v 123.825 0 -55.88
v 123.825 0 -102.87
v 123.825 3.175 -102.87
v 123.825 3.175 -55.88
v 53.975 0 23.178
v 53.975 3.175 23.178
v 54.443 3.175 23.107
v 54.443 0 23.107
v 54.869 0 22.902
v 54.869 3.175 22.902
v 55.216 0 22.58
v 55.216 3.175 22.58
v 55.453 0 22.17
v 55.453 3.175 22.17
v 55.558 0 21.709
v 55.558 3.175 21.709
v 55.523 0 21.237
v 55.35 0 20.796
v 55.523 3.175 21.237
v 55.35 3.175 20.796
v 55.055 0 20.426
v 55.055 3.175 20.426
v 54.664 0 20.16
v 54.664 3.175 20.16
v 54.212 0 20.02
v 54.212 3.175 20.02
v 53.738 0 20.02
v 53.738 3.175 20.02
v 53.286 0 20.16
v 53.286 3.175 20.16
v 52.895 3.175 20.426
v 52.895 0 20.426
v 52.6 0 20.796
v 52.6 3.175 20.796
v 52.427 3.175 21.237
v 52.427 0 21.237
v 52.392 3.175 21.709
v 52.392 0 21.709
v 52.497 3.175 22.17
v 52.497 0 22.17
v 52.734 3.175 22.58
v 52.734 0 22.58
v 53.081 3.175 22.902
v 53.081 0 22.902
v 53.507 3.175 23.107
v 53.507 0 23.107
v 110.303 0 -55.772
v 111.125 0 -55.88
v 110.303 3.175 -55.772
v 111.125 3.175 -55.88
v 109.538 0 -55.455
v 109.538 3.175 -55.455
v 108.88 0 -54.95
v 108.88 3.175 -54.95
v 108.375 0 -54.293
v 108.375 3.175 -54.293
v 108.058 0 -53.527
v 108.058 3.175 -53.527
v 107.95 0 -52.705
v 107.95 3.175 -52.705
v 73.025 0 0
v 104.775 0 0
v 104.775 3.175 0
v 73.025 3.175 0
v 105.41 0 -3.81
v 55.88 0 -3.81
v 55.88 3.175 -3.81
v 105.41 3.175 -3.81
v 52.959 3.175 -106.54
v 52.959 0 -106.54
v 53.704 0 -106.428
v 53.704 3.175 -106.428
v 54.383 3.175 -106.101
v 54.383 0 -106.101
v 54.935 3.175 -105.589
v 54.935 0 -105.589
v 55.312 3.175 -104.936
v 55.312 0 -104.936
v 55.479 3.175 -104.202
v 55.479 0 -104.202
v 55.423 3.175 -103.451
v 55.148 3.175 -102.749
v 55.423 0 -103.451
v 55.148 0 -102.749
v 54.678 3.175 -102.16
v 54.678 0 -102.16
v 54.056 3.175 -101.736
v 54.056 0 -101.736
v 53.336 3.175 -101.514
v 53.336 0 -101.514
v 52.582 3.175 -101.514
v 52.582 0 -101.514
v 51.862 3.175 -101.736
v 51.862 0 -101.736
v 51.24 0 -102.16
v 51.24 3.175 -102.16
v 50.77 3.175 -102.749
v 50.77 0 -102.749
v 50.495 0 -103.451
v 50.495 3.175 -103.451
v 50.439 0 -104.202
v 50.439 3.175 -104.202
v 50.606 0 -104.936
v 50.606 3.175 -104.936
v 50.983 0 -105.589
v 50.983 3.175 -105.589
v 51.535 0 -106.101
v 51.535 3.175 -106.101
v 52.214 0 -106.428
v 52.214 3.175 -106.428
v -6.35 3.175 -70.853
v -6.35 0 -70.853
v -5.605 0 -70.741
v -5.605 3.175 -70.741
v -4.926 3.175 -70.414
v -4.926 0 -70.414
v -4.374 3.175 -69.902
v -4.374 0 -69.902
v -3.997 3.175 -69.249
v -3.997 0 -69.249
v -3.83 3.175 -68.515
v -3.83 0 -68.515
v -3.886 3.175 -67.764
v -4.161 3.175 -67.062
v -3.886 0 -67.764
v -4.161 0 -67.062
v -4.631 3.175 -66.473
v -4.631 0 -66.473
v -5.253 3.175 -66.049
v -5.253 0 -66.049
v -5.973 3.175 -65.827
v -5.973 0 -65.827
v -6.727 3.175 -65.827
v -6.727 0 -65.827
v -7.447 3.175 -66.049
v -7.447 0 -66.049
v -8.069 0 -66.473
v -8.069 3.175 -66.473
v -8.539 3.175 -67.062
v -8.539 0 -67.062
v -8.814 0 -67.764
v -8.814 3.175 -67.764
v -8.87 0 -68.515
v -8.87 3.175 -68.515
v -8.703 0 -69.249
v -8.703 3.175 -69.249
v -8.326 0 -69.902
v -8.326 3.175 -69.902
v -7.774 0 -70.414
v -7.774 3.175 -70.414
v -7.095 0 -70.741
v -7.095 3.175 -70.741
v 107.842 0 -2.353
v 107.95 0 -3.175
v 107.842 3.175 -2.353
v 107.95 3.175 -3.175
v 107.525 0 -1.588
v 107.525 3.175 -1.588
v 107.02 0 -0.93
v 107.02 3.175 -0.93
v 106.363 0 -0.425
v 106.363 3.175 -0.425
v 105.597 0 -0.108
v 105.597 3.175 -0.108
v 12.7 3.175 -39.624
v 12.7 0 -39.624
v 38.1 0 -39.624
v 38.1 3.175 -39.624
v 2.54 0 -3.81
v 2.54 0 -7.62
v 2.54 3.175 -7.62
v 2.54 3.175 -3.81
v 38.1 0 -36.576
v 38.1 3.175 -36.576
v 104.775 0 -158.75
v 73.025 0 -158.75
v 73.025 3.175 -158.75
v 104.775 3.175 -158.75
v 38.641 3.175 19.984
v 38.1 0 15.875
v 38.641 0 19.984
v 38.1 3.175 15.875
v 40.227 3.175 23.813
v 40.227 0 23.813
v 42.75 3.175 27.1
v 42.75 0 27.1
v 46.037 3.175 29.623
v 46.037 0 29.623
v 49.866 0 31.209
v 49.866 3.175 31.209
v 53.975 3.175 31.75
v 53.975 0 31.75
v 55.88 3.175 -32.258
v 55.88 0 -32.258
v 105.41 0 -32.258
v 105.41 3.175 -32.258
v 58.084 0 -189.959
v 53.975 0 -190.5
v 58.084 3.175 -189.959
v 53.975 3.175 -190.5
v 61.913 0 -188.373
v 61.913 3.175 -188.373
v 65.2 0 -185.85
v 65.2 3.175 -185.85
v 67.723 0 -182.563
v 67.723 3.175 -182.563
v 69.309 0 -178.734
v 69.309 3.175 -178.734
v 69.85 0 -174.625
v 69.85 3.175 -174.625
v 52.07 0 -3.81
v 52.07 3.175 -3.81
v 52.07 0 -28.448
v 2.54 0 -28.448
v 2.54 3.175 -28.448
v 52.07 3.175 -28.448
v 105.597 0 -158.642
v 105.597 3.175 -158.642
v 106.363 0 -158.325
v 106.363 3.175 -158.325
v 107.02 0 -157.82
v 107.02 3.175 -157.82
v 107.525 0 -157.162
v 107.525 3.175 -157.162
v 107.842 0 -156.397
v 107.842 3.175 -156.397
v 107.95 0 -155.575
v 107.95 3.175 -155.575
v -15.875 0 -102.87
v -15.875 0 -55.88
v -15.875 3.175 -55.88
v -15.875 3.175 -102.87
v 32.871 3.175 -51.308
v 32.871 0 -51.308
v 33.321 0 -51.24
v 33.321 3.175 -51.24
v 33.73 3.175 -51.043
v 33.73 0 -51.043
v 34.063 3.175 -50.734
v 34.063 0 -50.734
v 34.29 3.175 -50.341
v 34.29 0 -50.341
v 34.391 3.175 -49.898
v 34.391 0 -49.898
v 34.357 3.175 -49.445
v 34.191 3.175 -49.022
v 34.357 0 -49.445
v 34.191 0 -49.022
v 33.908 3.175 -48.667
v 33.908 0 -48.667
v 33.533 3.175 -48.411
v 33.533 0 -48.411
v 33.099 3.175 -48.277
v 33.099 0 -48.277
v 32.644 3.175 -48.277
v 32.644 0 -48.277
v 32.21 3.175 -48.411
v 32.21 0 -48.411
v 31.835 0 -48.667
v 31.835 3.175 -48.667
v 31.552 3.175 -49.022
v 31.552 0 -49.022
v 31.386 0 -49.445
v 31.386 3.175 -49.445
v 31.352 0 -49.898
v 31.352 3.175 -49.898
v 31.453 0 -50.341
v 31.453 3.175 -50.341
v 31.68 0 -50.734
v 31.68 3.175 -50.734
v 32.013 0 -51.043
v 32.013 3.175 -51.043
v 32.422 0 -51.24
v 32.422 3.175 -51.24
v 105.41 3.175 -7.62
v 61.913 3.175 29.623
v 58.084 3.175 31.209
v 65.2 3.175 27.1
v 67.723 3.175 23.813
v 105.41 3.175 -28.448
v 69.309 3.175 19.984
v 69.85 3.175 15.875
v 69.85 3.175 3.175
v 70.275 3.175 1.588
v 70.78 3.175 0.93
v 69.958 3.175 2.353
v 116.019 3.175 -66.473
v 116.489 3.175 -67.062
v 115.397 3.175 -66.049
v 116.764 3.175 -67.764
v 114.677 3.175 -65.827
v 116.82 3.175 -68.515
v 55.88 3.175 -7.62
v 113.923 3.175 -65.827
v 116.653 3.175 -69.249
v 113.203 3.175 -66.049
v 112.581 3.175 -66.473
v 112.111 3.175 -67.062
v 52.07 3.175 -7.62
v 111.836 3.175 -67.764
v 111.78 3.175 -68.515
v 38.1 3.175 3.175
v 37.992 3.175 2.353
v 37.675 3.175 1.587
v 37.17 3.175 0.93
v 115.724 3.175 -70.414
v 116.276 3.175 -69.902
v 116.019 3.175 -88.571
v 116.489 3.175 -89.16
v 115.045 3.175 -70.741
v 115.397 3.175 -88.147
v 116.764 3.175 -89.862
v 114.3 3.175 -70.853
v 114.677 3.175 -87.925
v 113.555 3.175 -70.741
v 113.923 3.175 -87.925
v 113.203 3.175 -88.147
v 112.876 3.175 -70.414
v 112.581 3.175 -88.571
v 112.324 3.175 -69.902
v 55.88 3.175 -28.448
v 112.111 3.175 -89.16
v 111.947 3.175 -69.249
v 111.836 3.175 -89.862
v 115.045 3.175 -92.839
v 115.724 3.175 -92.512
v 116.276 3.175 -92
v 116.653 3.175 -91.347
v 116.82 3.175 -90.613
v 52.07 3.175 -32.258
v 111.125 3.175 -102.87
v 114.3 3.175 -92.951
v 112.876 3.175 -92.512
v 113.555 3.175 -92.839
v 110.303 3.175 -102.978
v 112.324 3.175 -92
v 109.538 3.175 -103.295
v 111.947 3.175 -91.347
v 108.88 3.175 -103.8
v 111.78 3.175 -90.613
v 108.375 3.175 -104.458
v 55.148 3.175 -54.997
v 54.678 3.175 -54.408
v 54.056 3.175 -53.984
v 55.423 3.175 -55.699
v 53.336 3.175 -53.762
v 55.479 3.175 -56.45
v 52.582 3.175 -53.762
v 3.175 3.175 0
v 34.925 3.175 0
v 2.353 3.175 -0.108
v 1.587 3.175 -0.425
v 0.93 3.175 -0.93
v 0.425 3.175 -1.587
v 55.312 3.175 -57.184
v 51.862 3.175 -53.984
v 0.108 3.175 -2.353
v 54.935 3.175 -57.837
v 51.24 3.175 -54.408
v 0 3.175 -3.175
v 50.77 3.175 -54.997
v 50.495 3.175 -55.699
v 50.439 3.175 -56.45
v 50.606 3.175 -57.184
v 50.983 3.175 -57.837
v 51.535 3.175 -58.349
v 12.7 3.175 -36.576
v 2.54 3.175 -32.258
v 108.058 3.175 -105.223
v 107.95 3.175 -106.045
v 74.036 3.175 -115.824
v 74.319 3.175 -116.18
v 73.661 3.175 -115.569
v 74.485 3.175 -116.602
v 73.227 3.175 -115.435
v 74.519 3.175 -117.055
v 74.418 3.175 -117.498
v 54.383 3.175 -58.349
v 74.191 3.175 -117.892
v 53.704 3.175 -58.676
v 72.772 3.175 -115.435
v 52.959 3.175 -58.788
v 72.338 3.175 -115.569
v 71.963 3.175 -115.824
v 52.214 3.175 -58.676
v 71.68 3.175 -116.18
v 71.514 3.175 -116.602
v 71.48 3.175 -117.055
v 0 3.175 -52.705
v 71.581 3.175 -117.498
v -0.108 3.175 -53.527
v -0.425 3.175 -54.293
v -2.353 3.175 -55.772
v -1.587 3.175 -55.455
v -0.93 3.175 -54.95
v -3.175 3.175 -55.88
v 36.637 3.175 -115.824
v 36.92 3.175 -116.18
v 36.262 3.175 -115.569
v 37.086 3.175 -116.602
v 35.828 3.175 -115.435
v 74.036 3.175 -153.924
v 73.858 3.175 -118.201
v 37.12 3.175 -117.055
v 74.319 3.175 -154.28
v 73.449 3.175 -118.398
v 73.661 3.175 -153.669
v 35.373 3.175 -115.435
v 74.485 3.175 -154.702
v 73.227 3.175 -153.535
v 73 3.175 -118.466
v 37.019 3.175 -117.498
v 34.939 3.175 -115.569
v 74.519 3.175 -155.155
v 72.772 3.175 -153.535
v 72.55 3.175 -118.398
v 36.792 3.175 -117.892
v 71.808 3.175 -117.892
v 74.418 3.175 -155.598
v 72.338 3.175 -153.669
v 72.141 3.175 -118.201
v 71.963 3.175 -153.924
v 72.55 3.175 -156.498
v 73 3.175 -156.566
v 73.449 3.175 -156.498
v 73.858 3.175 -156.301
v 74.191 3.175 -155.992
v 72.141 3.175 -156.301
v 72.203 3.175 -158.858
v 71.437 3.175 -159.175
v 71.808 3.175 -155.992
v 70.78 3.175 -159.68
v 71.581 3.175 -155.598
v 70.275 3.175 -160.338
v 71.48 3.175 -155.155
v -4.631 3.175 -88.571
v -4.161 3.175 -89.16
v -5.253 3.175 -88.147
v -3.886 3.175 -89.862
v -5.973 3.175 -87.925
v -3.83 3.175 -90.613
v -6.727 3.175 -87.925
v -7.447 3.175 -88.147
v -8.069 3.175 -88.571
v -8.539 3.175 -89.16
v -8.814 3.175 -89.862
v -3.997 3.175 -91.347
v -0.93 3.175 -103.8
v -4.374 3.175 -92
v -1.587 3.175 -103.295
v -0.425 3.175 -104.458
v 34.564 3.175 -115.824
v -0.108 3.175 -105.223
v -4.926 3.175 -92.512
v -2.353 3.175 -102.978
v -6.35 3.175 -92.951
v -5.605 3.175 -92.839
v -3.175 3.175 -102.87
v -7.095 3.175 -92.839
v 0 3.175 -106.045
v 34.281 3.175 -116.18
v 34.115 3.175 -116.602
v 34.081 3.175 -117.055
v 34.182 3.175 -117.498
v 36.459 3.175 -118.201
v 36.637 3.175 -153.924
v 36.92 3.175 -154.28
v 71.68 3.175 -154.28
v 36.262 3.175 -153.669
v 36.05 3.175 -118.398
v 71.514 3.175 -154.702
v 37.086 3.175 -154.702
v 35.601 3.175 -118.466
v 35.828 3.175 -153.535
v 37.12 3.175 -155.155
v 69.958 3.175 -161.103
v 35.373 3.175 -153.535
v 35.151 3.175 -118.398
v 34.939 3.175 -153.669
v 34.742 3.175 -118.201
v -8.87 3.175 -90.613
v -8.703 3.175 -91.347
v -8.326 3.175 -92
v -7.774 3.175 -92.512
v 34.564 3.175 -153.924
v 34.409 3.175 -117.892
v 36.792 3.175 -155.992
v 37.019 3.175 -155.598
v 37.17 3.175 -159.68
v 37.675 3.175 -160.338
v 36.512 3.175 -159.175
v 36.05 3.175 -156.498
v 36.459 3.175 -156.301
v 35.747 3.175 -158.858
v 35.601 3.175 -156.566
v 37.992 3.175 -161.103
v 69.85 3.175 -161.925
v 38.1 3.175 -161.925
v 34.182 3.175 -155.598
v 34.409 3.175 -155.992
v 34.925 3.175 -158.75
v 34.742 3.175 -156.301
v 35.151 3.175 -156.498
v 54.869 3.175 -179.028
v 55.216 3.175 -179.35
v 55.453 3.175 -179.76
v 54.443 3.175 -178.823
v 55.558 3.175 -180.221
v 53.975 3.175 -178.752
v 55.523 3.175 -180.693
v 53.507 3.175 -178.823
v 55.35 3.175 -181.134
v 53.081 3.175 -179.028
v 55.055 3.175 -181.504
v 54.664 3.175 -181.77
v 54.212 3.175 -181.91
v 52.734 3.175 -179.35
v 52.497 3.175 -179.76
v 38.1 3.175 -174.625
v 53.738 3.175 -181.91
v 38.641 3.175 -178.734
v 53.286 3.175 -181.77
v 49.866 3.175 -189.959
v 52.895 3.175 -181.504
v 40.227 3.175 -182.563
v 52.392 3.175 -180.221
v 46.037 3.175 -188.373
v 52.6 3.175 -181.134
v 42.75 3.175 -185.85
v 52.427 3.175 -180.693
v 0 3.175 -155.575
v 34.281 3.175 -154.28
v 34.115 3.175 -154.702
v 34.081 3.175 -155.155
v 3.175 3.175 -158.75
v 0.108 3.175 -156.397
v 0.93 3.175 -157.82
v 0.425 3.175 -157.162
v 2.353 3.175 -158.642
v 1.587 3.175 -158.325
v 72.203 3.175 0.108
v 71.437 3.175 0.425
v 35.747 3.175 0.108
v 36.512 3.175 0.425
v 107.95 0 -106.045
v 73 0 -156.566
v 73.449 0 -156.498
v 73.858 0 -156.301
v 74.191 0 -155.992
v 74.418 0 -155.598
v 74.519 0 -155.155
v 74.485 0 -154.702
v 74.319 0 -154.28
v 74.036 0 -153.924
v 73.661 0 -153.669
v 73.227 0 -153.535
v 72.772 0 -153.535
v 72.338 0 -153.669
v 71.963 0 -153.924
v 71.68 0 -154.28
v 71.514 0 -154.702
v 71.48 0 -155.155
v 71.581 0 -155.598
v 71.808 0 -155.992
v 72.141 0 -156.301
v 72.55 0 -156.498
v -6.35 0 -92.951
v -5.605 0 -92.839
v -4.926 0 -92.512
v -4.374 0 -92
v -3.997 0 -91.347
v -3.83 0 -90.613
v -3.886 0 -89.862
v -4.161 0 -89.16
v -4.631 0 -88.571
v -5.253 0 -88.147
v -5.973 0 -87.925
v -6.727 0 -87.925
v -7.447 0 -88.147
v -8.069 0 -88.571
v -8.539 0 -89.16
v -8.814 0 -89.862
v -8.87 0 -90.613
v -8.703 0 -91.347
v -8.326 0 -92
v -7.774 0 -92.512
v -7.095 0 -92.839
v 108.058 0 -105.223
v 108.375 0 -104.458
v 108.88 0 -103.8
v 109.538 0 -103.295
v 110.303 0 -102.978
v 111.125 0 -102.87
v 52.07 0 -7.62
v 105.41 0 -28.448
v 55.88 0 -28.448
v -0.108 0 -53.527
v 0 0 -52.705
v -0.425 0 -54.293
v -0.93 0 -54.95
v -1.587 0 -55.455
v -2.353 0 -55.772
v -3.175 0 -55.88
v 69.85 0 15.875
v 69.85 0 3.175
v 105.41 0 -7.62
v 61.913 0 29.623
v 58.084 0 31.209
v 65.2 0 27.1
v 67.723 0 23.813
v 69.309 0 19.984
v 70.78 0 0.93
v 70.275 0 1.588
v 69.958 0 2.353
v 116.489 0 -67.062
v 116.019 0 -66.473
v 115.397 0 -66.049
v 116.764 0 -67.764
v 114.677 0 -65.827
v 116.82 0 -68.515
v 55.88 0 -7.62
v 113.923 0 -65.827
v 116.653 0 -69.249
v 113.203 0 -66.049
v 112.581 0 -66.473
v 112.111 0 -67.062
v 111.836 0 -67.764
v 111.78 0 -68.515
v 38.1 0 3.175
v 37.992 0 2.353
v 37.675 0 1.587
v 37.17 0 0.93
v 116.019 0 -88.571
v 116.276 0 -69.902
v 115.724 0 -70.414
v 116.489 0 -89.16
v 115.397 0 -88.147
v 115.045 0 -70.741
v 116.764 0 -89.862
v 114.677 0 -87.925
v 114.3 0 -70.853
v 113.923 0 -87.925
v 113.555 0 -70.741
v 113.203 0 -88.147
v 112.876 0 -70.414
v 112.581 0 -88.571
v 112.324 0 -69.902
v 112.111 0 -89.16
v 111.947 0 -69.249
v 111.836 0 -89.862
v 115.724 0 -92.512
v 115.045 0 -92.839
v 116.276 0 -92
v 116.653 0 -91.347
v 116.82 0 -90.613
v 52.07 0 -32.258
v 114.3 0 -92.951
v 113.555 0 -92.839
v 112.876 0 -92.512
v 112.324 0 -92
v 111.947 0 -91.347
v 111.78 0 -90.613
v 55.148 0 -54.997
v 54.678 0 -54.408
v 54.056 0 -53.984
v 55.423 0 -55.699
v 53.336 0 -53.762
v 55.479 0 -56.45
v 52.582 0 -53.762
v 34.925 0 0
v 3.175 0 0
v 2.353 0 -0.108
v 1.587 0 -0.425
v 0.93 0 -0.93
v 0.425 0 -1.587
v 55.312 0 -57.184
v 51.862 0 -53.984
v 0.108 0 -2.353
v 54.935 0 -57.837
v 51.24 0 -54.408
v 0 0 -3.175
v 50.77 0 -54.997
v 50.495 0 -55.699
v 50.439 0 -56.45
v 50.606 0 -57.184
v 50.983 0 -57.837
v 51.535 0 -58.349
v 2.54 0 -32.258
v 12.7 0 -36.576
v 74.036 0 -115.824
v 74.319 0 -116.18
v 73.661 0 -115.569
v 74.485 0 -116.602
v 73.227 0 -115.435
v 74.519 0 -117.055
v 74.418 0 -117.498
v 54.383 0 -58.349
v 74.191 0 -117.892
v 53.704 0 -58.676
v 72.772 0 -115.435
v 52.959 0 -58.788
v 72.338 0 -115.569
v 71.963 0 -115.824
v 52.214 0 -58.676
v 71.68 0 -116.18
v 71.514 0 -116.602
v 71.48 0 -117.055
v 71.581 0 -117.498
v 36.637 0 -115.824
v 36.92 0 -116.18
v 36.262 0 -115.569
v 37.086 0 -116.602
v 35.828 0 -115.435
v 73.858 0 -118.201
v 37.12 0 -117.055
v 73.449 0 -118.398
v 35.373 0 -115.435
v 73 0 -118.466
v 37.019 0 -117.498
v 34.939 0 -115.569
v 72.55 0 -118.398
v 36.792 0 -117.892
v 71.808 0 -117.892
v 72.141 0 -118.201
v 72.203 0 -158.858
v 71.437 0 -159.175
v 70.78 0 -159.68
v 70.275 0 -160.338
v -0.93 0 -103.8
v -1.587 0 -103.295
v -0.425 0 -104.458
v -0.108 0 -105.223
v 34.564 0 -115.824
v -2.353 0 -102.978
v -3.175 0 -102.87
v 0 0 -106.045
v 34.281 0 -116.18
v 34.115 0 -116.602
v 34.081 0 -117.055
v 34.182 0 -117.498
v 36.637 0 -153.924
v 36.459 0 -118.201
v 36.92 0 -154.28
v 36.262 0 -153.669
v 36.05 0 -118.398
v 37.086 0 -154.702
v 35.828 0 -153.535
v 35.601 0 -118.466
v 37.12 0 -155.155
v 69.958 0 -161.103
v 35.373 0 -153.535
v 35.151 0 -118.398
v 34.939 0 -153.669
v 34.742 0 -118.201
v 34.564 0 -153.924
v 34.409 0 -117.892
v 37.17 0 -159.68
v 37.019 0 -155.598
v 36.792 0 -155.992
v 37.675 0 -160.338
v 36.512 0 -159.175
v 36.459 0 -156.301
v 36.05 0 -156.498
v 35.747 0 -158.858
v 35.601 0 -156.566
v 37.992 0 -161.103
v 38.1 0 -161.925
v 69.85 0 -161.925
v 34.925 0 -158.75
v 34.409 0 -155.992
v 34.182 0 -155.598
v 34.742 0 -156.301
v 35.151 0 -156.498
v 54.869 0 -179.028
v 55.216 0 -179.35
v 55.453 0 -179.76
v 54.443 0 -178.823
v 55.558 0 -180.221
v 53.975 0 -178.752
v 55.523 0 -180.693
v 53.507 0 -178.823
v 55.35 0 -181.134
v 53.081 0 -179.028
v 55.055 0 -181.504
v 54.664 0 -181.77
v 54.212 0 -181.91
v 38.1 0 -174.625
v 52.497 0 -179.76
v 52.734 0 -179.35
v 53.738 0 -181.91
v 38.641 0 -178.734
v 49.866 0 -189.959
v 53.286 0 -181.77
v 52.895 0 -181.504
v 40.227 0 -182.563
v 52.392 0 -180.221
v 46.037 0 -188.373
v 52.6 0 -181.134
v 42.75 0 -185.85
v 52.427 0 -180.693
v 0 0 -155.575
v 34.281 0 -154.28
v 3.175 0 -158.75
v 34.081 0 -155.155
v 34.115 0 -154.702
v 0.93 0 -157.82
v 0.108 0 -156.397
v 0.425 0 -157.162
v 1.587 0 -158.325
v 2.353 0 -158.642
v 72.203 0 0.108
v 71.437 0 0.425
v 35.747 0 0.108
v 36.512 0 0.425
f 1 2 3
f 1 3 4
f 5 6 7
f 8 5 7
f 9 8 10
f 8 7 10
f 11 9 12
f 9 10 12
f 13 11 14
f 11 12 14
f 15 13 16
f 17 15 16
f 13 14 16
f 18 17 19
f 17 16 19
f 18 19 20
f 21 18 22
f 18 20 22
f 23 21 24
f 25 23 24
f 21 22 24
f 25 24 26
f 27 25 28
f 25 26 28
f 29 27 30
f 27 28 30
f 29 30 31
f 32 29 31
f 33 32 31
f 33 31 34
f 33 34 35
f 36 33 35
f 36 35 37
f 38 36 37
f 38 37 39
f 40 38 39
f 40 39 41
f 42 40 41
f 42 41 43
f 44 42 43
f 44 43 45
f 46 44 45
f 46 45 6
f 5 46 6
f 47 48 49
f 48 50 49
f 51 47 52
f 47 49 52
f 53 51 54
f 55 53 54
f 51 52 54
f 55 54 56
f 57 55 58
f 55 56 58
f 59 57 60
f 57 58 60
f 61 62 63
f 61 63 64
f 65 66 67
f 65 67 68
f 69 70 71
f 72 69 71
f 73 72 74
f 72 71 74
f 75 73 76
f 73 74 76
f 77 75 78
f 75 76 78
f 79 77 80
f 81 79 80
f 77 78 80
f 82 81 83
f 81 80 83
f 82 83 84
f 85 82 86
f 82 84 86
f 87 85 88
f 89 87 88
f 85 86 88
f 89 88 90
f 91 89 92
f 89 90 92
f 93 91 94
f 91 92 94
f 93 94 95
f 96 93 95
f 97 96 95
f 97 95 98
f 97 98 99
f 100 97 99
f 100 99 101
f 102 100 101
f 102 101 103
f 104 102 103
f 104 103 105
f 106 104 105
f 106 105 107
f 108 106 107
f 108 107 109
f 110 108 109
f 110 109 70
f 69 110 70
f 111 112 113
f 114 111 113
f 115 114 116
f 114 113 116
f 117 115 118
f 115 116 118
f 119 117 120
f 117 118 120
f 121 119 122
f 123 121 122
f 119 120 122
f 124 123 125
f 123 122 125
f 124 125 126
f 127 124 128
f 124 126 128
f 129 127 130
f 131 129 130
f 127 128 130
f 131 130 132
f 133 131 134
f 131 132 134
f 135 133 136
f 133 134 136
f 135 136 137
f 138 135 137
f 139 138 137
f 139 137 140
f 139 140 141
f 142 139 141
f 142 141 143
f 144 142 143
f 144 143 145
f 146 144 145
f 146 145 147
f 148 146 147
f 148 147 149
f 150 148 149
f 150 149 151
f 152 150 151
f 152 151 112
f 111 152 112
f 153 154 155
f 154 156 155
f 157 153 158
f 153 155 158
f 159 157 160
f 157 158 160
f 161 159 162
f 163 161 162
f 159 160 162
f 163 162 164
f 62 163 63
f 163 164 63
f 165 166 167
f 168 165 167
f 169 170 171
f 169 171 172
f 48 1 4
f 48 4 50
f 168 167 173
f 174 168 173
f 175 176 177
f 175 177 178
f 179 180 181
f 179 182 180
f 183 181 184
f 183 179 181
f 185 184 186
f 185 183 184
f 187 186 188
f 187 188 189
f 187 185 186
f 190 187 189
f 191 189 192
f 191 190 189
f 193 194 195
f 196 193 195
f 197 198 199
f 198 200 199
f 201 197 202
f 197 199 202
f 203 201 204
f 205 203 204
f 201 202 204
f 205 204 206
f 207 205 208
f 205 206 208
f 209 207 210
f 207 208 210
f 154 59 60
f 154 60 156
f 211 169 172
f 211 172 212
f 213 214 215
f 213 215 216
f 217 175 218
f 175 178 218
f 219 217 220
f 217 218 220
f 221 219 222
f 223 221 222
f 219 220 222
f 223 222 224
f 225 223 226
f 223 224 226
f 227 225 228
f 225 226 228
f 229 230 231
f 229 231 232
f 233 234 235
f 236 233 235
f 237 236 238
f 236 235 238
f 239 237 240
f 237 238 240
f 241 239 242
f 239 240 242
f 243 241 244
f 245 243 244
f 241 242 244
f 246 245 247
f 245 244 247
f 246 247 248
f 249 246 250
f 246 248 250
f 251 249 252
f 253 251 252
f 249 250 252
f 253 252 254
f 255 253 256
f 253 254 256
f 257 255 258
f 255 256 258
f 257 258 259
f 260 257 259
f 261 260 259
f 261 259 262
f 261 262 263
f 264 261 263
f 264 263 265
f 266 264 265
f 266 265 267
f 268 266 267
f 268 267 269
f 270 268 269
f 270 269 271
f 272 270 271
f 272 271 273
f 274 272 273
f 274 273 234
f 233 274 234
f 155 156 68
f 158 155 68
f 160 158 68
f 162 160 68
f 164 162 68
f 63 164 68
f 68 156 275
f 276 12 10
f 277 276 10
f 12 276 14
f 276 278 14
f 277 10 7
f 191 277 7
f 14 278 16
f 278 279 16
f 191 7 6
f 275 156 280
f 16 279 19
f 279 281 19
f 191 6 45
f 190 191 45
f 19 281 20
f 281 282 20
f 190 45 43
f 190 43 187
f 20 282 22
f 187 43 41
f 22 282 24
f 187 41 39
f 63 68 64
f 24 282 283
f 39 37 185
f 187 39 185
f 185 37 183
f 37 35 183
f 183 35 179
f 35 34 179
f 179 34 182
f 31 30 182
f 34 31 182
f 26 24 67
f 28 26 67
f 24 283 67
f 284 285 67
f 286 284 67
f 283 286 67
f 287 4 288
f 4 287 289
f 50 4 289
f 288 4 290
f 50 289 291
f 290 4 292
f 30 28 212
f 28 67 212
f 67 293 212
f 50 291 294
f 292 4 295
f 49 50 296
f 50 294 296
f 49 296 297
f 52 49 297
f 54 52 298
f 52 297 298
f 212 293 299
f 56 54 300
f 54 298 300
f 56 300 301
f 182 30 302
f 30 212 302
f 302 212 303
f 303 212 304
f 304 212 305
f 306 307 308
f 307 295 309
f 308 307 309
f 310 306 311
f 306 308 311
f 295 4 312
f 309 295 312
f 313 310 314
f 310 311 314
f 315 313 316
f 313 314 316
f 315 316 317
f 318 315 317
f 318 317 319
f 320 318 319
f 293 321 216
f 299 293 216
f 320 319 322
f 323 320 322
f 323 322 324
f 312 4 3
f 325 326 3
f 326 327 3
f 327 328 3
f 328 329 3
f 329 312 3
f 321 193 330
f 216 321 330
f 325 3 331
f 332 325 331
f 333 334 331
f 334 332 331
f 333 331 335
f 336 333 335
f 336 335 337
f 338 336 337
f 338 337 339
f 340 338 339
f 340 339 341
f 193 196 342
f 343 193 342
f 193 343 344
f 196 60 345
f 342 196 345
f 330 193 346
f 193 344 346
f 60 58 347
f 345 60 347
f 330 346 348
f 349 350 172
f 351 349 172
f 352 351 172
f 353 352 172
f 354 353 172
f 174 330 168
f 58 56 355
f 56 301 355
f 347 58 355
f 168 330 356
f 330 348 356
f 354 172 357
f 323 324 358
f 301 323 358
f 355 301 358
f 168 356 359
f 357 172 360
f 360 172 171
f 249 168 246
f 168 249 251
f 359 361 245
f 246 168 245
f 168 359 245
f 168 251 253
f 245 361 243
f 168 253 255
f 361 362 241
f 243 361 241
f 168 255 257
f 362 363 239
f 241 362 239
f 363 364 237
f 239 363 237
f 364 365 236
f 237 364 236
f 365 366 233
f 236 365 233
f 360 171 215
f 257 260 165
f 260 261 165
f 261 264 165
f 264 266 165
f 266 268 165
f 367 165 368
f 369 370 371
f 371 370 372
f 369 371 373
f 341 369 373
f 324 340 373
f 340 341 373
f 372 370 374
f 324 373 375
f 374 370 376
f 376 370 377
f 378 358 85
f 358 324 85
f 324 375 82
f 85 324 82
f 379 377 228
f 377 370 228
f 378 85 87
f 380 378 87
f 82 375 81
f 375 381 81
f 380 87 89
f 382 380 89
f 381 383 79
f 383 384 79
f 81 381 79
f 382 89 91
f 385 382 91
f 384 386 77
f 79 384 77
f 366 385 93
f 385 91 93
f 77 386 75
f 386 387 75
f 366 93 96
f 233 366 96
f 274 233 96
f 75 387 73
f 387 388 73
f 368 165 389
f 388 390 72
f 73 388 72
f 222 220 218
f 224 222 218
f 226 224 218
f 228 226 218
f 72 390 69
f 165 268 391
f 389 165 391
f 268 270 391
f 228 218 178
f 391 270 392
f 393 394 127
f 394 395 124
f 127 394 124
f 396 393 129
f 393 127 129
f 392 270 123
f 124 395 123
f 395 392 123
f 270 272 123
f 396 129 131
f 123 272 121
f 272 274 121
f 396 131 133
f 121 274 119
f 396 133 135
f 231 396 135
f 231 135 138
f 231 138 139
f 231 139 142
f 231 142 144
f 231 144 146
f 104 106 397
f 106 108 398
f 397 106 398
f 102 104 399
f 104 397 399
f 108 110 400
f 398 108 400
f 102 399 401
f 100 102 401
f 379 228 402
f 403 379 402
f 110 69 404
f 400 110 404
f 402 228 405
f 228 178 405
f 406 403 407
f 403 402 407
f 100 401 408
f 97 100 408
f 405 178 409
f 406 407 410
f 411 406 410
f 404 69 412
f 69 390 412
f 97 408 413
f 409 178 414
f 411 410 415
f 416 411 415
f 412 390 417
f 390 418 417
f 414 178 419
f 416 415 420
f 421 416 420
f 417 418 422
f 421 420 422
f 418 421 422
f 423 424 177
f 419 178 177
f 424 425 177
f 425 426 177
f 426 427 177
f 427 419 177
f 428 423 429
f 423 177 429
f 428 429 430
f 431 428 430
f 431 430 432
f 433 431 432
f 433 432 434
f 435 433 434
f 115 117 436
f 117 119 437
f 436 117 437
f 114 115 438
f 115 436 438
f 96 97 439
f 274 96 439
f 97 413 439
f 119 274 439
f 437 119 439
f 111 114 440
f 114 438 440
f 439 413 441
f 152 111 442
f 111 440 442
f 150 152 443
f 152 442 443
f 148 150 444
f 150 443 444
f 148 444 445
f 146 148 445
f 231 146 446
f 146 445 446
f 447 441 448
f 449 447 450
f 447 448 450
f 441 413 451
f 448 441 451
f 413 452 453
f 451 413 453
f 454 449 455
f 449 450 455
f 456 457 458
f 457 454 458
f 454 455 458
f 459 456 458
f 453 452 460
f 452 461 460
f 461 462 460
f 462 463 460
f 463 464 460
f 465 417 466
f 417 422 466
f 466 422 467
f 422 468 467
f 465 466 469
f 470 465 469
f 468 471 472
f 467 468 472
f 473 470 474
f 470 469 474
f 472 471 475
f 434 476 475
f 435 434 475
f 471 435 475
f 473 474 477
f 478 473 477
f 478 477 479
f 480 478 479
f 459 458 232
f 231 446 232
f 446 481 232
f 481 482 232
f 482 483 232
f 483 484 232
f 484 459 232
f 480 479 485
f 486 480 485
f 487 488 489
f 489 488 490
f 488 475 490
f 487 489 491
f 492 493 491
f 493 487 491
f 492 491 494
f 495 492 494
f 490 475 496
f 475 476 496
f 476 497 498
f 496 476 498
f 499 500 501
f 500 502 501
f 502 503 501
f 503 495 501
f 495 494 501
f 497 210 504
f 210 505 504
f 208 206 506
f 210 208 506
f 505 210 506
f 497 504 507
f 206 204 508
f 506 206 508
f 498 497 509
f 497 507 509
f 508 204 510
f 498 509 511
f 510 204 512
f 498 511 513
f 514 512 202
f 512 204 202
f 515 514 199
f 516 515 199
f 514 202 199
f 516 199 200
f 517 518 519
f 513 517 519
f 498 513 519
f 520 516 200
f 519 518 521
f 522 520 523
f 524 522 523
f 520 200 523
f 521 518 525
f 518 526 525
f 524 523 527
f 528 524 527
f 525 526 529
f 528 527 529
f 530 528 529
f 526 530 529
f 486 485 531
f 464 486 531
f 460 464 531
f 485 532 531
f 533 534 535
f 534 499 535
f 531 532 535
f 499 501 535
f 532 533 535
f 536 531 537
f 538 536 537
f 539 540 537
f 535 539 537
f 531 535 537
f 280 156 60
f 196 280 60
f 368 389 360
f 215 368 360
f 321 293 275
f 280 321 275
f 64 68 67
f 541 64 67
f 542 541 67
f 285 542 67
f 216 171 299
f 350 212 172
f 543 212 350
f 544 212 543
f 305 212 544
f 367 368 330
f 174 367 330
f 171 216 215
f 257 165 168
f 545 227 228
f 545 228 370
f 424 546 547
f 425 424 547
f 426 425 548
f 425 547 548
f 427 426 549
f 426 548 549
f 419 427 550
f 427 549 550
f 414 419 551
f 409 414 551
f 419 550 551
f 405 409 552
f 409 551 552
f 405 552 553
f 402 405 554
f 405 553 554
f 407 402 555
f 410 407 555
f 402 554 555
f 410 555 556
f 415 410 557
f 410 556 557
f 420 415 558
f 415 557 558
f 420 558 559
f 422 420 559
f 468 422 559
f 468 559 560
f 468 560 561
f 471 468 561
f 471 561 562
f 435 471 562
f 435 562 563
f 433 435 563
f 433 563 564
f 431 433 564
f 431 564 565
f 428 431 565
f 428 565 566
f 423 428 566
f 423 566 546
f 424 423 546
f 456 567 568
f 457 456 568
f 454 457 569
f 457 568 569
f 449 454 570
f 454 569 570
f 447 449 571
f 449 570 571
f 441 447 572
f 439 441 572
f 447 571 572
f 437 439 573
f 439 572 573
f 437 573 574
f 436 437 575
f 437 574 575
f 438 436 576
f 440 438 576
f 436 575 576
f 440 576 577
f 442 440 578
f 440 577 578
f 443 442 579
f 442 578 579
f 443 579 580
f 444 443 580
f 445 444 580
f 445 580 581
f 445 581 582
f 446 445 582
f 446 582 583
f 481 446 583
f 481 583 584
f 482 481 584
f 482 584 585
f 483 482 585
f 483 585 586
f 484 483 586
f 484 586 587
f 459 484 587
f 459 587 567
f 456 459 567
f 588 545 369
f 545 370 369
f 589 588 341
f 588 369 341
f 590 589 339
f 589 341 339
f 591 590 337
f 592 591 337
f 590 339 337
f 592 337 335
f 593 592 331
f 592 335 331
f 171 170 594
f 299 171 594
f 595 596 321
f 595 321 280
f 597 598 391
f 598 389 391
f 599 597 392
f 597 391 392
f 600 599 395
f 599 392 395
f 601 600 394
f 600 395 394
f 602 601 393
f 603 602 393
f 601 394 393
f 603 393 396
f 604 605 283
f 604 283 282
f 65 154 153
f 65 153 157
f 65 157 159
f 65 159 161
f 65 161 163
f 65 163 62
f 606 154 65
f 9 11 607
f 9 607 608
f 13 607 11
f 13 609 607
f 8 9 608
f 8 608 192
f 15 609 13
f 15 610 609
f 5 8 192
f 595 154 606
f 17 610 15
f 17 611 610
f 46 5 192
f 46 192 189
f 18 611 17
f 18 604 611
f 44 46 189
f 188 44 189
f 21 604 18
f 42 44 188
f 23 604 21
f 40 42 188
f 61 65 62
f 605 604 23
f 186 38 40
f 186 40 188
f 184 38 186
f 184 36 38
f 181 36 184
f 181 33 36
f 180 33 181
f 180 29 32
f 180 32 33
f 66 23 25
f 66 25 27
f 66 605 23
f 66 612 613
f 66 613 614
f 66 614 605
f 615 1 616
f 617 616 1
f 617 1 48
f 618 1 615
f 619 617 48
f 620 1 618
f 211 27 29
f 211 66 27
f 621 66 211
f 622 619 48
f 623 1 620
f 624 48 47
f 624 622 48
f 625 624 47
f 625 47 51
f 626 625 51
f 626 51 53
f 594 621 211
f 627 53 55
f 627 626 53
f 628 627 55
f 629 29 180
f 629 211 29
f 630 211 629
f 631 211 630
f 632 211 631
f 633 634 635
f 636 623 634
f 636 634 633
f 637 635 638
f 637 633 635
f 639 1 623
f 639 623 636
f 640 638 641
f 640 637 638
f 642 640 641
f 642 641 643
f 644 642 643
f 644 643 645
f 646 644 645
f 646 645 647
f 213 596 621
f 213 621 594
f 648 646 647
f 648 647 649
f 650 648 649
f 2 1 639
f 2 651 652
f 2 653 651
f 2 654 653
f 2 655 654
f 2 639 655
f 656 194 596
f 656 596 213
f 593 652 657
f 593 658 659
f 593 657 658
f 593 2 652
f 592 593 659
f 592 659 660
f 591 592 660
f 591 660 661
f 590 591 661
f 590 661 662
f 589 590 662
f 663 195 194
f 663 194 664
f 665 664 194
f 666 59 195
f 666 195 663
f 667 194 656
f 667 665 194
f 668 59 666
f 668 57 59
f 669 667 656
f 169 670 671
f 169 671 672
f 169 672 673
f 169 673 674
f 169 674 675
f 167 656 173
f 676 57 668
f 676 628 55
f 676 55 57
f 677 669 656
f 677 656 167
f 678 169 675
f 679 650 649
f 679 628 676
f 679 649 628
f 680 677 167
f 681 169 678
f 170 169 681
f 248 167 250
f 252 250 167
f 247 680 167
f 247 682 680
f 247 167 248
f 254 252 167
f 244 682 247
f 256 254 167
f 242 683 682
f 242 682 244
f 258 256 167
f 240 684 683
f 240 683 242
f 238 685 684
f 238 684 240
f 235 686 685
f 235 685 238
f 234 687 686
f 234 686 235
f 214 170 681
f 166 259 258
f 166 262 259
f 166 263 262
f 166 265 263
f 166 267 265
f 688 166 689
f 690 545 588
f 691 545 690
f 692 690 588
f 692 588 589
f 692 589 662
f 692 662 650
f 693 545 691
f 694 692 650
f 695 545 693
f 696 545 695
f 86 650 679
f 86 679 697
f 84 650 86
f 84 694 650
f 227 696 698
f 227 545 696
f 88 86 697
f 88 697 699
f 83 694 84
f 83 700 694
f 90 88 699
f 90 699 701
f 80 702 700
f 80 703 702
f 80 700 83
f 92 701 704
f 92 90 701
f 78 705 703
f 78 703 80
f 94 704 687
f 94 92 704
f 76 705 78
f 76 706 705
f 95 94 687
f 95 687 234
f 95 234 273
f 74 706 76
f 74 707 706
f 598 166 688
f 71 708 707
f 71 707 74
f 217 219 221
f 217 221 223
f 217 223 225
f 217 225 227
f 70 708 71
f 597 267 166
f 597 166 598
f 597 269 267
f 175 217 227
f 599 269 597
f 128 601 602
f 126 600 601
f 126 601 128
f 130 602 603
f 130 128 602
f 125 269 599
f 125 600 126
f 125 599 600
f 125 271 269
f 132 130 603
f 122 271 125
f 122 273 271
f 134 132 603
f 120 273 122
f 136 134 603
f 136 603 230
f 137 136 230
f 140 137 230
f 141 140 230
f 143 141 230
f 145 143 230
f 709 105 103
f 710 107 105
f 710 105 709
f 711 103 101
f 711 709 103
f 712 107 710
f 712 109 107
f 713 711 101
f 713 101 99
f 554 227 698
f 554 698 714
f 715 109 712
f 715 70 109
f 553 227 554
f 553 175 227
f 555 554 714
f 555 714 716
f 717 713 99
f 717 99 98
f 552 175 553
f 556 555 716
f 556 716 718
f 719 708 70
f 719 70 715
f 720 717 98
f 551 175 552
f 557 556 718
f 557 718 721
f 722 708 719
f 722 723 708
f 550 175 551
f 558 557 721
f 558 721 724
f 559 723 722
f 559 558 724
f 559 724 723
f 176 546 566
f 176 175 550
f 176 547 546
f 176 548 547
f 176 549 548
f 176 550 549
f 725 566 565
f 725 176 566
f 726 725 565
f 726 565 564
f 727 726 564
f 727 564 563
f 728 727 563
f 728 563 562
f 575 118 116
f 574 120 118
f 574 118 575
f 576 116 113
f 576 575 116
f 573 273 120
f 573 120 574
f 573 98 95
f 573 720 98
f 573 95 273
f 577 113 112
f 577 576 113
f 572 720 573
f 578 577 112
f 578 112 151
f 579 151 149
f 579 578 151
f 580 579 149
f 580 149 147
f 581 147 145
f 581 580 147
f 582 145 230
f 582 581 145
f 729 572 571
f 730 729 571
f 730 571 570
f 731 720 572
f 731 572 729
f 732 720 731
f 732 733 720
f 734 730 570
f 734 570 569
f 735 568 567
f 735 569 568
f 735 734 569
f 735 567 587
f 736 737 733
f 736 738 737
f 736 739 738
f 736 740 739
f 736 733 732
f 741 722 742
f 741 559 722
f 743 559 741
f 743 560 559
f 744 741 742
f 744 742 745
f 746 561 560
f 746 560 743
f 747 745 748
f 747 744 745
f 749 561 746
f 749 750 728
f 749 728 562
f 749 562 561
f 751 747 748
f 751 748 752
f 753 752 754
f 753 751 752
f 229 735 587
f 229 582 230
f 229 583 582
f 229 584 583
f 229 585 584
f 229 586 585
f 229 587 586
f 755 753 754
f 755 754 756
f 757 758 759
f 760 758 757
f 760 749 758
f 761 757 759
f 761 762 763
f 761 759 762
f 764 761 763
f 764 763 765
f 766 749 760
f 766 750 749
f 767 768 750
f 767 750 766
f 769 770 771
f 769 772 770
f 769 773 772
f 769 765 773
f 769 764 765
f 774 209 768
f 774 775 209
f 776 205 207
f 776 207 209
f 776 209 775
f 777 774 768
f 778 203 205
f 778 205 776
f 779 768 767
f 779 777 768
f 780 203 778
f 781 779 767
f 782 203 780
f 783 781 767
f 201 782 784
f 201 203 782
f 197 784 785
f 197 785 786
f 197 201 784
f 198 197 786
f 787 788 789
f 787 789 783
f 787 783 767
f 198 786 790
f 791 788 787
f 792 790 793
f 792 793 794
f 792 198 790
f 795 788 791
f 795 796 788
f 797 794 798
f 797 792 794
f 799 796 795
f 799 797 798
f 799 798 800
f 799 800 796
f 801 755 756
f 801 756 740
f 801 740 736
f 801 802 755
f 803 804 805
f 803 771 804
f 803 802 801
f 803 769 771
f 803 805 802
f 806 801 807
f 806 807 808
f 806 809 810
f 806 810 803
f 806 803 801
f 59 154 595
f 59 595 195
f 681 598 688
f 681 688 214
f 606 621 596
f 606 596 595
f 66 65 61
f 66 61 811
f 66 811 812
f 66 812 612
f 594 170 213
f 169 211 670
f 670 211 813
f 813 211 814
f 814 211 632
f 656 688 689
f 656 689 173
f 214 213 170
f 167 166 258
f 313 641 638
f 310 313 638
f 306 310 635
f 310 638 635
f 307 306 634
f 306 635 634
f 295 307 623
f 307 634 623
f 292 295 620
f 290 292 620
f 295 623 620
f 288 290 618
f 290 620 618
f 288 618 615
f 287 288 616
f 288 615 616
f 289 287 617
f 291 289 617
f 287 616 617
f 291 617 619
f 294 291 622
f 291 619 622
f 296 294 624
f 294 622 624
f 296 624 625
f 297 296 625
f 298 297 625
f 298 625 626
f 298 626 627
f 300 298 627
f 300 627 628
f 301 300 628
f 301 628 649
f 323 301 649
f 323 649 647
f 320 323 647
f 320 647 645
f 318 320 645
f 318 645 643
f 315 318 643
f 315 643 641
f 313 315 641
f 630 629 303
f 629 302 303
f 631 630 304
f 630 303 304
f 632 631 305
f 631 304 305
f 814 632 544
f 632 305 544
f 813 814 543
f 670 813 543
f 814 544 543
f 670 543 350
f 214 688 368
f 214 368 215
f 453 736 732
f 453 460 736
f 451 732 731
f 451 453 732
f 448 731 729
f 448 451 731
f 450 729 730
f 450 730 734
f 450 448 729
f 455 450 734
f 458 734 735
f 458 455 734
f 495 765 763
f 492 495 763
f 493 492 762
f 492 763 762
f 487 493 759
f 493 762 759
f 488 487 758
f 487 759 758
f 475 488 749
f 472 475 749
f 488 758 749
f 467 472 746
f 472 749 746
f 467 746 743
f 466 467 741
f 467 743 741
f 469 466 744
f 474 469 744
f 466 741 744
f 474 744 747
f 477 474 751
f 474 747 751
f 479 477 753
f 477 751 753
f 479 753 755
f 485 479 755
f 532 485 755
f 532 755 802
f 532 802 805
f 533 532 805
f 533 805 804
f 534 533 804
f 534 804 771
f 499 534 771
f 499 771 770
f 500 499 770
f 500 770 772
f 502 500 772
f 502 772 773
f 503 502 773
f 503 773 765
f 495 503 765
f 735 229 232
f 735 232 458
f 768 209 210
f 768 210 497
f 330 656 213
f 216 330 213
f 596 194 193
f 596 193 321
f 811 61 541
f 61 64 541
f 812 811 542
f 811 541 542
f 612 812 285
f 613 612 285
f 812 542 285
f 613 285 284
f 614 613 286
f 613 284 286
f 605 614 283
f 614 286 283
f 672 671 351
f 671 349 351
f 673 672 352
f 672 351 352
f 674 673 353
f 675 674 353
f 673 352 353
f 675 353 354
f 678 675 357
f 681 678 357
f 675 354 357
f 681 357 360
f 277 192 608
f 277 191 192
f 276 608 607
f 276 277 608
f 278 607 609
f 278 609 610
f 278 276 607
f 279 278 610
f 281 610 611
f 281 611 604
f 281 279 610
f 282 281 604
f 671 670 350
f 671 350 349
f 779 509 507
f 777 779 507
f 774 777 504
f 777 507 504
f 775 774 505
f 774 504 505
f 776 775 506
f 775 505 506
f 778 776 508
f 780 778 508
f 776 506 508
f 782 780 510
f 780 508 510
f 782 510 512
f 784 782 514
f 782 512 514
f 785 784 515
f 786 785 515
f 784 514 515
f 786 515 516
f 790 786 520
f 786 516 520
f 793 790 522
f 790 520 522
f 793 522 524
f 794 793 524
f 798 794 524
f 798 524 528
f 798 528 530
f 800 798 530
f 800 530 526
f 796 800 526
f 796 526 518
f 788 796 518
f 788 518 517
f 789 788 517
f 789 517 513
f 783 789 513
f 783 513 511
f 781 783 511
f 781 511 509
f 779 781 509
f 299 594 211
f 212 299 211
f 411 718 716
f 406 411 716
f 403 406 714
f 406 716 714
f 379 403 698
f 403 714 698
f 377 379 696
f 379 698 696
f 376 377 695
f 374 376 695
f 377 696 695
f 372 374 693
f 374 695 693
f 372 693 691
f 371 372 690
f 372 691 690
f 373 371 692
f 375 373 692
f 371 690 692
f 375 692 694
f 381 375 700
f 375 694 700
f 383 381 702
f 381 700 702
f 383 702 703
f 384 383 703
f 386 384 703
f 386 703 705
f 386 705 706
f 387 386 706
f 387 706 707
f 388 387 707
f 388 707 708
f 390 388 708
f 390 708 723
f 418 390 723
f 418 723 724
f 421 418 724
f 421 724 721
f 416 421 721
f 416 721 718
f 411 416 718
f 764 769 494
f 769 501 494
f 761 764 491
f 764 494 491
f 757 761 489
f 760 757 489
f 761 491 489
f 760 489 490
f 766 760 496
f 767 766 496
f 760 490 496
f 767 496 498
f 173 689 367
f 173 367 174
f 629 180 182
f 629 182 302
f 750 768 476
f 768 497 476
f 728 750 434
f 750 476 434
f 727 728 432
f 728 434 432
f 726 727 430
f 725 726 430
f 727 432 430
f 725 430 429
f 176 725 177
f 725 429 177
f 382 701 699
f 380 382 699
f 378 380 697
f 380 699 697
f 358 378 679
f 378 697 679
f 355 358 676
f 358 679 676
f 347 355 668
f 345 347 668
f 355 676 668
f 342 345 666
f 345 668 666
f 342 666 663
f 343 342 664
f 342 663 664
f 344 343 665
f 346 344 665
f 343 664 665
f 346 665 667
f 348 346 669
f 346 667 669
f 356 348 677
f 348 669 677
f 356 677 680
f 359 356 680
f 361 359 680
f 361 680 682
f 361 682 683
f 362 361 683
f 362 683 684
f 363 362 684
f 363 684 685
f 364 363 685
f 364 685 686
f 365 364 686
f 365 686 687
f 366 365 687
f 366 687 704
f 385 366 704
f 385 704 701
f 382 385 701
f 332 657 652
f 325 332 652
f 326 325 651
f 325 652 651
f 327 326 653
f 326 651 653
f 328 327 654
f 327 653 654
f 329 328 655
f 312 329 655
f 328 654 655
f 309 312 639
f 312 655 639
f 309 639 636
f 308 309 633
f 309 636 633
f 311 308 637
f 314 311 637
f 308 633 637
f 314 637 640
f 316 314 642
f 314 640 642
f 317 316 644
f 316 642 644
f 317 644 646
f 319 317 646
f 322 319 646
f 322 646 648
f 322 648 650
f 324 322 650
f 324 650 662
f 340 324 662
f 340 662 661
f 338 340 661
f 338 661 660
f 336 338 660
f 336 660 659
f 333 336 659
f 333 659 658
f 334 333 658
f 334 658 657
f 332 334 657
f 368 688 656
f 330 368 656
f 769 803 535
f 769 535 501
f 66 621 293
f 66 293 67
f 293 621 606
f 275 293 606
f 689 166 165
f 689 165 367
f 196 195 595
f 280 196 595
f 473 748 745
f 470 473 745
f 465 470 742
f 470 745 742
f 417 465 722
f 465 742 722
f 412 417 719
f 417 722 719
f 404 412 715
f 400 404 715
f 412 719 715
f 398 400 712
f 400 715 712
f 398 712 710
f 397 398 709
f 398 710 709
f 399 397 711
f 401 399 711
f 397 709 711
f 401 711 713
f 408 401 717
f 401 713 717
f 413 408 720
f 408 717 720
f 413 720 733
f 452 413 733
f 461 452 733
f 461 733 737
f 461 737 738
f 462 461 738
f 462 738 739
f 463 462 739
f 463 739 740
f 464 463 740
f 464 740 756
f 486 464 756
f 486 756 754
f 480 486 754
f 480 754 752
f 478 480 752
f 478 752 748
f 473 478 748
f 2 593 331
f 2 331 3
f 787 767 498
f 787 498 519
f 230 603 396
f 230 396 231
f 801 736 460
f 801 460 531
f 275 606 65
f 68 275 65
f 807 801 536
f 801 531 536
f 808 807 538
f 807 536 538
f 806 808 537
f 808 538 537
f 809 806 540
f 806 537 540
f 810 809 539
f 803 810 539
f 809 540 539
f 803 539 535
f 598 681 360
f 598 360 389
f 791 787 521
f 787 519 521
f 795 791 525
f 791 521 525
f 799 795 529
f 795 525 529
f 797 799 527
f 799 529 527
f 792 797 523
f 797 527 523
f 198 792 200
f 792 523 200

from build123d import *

# Parameters (mm, degrees)
BOSS_EXTRUDE1_DEPTH = 3.175
FILLET1_R           = 3.175
FILLET2_R           = 15.875
SKETCH2_R           = 1.5875
CUT_EXTRUDE1_DEPTH  = 228.228874156
SKETCH3_R           = 2.5273
CUT_EXTRUDE2_DEPTH  = 228.228874156
SKETCH4_R           = 2.5273
CUT_EXTRUDE3_DEPTH  = 228.228874156
SKETCH7_R           = 1.524
CUT_EXTRUDE6_DEPTH  = 228.228874156
SKETCH8_R           = 1.524
CUT_EXTRUDE7_DEPTH  = 228.228874156
SKETCH10_W          = 25.4
SKETCH10_H          = 3.048
CUT_EXTRUDE9_DEPTH  = 228.228874156
SKETCH11_W          = 49.53
SKETCH11_H          = 3.81
CUT_EXTRUDE10_DEPTH = 228.228874156


with BuildPart() as part:
    # Sketch1 → Boss-Extrude1 (new body)
    with BuildSketch(Plane(origin=(0, 0, 0), x_dir=(1, 0, 0), z_dir=(0, 1, 0))):
        Polygon((0, 102.87), (0, 158.75), (38.1, 158.75), (38.1, 190.5), (69.85, 190.5), (69.85, 158.75), (107.95, 158.75), (107.95, 102.87), (123.825, 102.87), (123.825, 55.88), (107.95, 55.88), (107.95, 0), (69.85, 0), (69.85, -31.75), (38.1, -31.75), (38.1, 0), (0, 0), (0, 55.88), (-15.875, 55.88), (-15.875, 102.87), align=None)
    extrude(amount=BOSS_EXTRUDE1_DEPTH)

    # Fillet1
    fillet1_edges = [part.edges().sort_by_distance(p)[0] for p in [
        (0, 1.5875, -55.88),
        (0, 1.5875, -102.87),
        (0, 1.5875, -158.75),
        (38.1, 1.5875, -158.75),
        (69.85, 1.5875, -158.75),
        (107.95, 1.5875, -158.75),
        (107.95, 1.5875, -102.87),
        (107.95, 1.5875, -55.88),
        (107.95, 1.5875, 0),
        (69.85, 1.5875, 0),
        (38.1, 1.5875, 0),
        (0, 1.5875, 0),
    ]]
    fillet(fillet1_edges, radius=FILLET1_R)

    # Fillet2
    fillet2_edges = [part.edges().sort_by_distance(p)[0] for p in [
        (38.1, 1.5875, 31.75),
        (69.85, 1.5875, 31.75),
        (69.85, 1.5875, -190.5),
        (38.1, 1.5875, -190.5),
    ]]
    fillet(fillet2_edges, radius=FILLET2_R - 0.0001)  # a hair under: the kernel refuses the full size

    # Sketch2 → Cut-Extrude1 (cut, through all)
    with BuildSketch(Plane(origin=(0, 3.175, 0), x_dir=(1, 0, 0), z_dir=(0, 1, 0))):
        with Locations(Location((53.975, 180.34, 0), (0, 0, 270))):
            Circle(SKETCH2_R)
        with Locations(Location((53.975, -21.59, 0), (0, 0, 270))):
            Circle(SKETCH2_R)
    extrude(amount=-CUT_EXTRUDE1_DEPTH, mode=Mode.SUBTRACT)

    # Sketch3 → Cut-Extrude2 (cut, through all)
    with BuildSketch(Plane.XZ):
        with Locations(Location((-6.35, -68.326, 0), (0, 0, 270))):
            Circle(SKETCH3_R)
        with Locations(Location((-6.35, -90.424, 0), (0, 0, 270))):
            Circle(SKETCH3_R)
        with Locations(Location((114.3, -68.326, 0), (0, 0, 270))):
            Circle(SKETCH3_R)
        with Locations(Location((114.3, -90.424, 0), (0, 0, 270))):
            Circle(SKETCH3_R)
    extrude(amount=-CUT_EXTRUDE2_DEPTH, mode=Mode.SUBTRACT)

    # Sketch4 → Cut-Extrude3 (cut, through all)
    with BuildSketch(Plane.XZ):
        with Locations(Location((52.959, -56.261, 0), (0, 0, 270))):
            Circle(SKETCH4_R)
        with Locations(Location((52.959, -104.013, 0), (0, 0, 270))):
            Circle(SKETCH4_R)
    extrude(amount=-CUT_EXTRUDE3_DEPTH, mode=Mode.SUBTRACT)

    # Sketch7 → Cut-Extrude6 (cut, through all)
    with BuildSketch(Plane.XZ):
        with Locations(Location((32.87141, -49.784, 0), (0, 0, 270))):
            Circle(SKETCH7_R)
    extrude(amount=-CUT_EXTRUDE6_DEPTH, mode=Mode.SUBTRACT)

    # Sketch8 → Cut-Extrude7 (cut, through all)
    with BuildSketch(Plane.XZ):
        with Locations(Location((35.60064, -116.9416, 0), (0, 0, 270))):
            Circle(SKETCH8_R)
        with Locations(Location((35.60064, -155.0416, 0), (0, 0, 270))):
            Circle(SKETCH8_R)
        with Locations(Location((72.9996, -116.9416, 0), (0, 0, 270))):
            Circle(SKETCH8_R)
        with Locations(Location((72.9996, -155.0416, 0), (0, 0, 270))):
            Circle(SKETCH8_R)
    extrude(amount=-CUT_EXTRUDE7_DEPTH, mode=Mode.SUBTRACT)

    # Sketch10 → Cut-Extrude9 (cut, through all)
    with BuildSketch(Plane.XZ):
        with Locations((25.4, -38.1)):
            Rectangle(SKETCH10_W, SKETCH10_H)
    extrude(amount=-CUT_EXTRUDE9_DEPTH, mode=Mode.SUBTRACT)

    # Sketch11 → Cut-Extrude10 (cut, through all)
    with BuildSketch(Plane.XZ):
        with Locations((27.305, -5.715)):
            Rectangle(SKETCH11_W, SKETCH11_H)
        with Locations((27.305, -30.353)):
            Rectangle(SKETCH11_W, SKETCH11_H)
        with Locations((80.645, -5.715)):
            Rectangle(SKETCH11_W, SKETCH11_H)
        with Locations((80.645, -30.353)):
            Rectangle(SKETCH11_W, SKETCH11_H)
    extrude(amount=-CUT_EXTRUDE10_DEPTH, mode=Mode.SUBTRACT)


solid = part.part
